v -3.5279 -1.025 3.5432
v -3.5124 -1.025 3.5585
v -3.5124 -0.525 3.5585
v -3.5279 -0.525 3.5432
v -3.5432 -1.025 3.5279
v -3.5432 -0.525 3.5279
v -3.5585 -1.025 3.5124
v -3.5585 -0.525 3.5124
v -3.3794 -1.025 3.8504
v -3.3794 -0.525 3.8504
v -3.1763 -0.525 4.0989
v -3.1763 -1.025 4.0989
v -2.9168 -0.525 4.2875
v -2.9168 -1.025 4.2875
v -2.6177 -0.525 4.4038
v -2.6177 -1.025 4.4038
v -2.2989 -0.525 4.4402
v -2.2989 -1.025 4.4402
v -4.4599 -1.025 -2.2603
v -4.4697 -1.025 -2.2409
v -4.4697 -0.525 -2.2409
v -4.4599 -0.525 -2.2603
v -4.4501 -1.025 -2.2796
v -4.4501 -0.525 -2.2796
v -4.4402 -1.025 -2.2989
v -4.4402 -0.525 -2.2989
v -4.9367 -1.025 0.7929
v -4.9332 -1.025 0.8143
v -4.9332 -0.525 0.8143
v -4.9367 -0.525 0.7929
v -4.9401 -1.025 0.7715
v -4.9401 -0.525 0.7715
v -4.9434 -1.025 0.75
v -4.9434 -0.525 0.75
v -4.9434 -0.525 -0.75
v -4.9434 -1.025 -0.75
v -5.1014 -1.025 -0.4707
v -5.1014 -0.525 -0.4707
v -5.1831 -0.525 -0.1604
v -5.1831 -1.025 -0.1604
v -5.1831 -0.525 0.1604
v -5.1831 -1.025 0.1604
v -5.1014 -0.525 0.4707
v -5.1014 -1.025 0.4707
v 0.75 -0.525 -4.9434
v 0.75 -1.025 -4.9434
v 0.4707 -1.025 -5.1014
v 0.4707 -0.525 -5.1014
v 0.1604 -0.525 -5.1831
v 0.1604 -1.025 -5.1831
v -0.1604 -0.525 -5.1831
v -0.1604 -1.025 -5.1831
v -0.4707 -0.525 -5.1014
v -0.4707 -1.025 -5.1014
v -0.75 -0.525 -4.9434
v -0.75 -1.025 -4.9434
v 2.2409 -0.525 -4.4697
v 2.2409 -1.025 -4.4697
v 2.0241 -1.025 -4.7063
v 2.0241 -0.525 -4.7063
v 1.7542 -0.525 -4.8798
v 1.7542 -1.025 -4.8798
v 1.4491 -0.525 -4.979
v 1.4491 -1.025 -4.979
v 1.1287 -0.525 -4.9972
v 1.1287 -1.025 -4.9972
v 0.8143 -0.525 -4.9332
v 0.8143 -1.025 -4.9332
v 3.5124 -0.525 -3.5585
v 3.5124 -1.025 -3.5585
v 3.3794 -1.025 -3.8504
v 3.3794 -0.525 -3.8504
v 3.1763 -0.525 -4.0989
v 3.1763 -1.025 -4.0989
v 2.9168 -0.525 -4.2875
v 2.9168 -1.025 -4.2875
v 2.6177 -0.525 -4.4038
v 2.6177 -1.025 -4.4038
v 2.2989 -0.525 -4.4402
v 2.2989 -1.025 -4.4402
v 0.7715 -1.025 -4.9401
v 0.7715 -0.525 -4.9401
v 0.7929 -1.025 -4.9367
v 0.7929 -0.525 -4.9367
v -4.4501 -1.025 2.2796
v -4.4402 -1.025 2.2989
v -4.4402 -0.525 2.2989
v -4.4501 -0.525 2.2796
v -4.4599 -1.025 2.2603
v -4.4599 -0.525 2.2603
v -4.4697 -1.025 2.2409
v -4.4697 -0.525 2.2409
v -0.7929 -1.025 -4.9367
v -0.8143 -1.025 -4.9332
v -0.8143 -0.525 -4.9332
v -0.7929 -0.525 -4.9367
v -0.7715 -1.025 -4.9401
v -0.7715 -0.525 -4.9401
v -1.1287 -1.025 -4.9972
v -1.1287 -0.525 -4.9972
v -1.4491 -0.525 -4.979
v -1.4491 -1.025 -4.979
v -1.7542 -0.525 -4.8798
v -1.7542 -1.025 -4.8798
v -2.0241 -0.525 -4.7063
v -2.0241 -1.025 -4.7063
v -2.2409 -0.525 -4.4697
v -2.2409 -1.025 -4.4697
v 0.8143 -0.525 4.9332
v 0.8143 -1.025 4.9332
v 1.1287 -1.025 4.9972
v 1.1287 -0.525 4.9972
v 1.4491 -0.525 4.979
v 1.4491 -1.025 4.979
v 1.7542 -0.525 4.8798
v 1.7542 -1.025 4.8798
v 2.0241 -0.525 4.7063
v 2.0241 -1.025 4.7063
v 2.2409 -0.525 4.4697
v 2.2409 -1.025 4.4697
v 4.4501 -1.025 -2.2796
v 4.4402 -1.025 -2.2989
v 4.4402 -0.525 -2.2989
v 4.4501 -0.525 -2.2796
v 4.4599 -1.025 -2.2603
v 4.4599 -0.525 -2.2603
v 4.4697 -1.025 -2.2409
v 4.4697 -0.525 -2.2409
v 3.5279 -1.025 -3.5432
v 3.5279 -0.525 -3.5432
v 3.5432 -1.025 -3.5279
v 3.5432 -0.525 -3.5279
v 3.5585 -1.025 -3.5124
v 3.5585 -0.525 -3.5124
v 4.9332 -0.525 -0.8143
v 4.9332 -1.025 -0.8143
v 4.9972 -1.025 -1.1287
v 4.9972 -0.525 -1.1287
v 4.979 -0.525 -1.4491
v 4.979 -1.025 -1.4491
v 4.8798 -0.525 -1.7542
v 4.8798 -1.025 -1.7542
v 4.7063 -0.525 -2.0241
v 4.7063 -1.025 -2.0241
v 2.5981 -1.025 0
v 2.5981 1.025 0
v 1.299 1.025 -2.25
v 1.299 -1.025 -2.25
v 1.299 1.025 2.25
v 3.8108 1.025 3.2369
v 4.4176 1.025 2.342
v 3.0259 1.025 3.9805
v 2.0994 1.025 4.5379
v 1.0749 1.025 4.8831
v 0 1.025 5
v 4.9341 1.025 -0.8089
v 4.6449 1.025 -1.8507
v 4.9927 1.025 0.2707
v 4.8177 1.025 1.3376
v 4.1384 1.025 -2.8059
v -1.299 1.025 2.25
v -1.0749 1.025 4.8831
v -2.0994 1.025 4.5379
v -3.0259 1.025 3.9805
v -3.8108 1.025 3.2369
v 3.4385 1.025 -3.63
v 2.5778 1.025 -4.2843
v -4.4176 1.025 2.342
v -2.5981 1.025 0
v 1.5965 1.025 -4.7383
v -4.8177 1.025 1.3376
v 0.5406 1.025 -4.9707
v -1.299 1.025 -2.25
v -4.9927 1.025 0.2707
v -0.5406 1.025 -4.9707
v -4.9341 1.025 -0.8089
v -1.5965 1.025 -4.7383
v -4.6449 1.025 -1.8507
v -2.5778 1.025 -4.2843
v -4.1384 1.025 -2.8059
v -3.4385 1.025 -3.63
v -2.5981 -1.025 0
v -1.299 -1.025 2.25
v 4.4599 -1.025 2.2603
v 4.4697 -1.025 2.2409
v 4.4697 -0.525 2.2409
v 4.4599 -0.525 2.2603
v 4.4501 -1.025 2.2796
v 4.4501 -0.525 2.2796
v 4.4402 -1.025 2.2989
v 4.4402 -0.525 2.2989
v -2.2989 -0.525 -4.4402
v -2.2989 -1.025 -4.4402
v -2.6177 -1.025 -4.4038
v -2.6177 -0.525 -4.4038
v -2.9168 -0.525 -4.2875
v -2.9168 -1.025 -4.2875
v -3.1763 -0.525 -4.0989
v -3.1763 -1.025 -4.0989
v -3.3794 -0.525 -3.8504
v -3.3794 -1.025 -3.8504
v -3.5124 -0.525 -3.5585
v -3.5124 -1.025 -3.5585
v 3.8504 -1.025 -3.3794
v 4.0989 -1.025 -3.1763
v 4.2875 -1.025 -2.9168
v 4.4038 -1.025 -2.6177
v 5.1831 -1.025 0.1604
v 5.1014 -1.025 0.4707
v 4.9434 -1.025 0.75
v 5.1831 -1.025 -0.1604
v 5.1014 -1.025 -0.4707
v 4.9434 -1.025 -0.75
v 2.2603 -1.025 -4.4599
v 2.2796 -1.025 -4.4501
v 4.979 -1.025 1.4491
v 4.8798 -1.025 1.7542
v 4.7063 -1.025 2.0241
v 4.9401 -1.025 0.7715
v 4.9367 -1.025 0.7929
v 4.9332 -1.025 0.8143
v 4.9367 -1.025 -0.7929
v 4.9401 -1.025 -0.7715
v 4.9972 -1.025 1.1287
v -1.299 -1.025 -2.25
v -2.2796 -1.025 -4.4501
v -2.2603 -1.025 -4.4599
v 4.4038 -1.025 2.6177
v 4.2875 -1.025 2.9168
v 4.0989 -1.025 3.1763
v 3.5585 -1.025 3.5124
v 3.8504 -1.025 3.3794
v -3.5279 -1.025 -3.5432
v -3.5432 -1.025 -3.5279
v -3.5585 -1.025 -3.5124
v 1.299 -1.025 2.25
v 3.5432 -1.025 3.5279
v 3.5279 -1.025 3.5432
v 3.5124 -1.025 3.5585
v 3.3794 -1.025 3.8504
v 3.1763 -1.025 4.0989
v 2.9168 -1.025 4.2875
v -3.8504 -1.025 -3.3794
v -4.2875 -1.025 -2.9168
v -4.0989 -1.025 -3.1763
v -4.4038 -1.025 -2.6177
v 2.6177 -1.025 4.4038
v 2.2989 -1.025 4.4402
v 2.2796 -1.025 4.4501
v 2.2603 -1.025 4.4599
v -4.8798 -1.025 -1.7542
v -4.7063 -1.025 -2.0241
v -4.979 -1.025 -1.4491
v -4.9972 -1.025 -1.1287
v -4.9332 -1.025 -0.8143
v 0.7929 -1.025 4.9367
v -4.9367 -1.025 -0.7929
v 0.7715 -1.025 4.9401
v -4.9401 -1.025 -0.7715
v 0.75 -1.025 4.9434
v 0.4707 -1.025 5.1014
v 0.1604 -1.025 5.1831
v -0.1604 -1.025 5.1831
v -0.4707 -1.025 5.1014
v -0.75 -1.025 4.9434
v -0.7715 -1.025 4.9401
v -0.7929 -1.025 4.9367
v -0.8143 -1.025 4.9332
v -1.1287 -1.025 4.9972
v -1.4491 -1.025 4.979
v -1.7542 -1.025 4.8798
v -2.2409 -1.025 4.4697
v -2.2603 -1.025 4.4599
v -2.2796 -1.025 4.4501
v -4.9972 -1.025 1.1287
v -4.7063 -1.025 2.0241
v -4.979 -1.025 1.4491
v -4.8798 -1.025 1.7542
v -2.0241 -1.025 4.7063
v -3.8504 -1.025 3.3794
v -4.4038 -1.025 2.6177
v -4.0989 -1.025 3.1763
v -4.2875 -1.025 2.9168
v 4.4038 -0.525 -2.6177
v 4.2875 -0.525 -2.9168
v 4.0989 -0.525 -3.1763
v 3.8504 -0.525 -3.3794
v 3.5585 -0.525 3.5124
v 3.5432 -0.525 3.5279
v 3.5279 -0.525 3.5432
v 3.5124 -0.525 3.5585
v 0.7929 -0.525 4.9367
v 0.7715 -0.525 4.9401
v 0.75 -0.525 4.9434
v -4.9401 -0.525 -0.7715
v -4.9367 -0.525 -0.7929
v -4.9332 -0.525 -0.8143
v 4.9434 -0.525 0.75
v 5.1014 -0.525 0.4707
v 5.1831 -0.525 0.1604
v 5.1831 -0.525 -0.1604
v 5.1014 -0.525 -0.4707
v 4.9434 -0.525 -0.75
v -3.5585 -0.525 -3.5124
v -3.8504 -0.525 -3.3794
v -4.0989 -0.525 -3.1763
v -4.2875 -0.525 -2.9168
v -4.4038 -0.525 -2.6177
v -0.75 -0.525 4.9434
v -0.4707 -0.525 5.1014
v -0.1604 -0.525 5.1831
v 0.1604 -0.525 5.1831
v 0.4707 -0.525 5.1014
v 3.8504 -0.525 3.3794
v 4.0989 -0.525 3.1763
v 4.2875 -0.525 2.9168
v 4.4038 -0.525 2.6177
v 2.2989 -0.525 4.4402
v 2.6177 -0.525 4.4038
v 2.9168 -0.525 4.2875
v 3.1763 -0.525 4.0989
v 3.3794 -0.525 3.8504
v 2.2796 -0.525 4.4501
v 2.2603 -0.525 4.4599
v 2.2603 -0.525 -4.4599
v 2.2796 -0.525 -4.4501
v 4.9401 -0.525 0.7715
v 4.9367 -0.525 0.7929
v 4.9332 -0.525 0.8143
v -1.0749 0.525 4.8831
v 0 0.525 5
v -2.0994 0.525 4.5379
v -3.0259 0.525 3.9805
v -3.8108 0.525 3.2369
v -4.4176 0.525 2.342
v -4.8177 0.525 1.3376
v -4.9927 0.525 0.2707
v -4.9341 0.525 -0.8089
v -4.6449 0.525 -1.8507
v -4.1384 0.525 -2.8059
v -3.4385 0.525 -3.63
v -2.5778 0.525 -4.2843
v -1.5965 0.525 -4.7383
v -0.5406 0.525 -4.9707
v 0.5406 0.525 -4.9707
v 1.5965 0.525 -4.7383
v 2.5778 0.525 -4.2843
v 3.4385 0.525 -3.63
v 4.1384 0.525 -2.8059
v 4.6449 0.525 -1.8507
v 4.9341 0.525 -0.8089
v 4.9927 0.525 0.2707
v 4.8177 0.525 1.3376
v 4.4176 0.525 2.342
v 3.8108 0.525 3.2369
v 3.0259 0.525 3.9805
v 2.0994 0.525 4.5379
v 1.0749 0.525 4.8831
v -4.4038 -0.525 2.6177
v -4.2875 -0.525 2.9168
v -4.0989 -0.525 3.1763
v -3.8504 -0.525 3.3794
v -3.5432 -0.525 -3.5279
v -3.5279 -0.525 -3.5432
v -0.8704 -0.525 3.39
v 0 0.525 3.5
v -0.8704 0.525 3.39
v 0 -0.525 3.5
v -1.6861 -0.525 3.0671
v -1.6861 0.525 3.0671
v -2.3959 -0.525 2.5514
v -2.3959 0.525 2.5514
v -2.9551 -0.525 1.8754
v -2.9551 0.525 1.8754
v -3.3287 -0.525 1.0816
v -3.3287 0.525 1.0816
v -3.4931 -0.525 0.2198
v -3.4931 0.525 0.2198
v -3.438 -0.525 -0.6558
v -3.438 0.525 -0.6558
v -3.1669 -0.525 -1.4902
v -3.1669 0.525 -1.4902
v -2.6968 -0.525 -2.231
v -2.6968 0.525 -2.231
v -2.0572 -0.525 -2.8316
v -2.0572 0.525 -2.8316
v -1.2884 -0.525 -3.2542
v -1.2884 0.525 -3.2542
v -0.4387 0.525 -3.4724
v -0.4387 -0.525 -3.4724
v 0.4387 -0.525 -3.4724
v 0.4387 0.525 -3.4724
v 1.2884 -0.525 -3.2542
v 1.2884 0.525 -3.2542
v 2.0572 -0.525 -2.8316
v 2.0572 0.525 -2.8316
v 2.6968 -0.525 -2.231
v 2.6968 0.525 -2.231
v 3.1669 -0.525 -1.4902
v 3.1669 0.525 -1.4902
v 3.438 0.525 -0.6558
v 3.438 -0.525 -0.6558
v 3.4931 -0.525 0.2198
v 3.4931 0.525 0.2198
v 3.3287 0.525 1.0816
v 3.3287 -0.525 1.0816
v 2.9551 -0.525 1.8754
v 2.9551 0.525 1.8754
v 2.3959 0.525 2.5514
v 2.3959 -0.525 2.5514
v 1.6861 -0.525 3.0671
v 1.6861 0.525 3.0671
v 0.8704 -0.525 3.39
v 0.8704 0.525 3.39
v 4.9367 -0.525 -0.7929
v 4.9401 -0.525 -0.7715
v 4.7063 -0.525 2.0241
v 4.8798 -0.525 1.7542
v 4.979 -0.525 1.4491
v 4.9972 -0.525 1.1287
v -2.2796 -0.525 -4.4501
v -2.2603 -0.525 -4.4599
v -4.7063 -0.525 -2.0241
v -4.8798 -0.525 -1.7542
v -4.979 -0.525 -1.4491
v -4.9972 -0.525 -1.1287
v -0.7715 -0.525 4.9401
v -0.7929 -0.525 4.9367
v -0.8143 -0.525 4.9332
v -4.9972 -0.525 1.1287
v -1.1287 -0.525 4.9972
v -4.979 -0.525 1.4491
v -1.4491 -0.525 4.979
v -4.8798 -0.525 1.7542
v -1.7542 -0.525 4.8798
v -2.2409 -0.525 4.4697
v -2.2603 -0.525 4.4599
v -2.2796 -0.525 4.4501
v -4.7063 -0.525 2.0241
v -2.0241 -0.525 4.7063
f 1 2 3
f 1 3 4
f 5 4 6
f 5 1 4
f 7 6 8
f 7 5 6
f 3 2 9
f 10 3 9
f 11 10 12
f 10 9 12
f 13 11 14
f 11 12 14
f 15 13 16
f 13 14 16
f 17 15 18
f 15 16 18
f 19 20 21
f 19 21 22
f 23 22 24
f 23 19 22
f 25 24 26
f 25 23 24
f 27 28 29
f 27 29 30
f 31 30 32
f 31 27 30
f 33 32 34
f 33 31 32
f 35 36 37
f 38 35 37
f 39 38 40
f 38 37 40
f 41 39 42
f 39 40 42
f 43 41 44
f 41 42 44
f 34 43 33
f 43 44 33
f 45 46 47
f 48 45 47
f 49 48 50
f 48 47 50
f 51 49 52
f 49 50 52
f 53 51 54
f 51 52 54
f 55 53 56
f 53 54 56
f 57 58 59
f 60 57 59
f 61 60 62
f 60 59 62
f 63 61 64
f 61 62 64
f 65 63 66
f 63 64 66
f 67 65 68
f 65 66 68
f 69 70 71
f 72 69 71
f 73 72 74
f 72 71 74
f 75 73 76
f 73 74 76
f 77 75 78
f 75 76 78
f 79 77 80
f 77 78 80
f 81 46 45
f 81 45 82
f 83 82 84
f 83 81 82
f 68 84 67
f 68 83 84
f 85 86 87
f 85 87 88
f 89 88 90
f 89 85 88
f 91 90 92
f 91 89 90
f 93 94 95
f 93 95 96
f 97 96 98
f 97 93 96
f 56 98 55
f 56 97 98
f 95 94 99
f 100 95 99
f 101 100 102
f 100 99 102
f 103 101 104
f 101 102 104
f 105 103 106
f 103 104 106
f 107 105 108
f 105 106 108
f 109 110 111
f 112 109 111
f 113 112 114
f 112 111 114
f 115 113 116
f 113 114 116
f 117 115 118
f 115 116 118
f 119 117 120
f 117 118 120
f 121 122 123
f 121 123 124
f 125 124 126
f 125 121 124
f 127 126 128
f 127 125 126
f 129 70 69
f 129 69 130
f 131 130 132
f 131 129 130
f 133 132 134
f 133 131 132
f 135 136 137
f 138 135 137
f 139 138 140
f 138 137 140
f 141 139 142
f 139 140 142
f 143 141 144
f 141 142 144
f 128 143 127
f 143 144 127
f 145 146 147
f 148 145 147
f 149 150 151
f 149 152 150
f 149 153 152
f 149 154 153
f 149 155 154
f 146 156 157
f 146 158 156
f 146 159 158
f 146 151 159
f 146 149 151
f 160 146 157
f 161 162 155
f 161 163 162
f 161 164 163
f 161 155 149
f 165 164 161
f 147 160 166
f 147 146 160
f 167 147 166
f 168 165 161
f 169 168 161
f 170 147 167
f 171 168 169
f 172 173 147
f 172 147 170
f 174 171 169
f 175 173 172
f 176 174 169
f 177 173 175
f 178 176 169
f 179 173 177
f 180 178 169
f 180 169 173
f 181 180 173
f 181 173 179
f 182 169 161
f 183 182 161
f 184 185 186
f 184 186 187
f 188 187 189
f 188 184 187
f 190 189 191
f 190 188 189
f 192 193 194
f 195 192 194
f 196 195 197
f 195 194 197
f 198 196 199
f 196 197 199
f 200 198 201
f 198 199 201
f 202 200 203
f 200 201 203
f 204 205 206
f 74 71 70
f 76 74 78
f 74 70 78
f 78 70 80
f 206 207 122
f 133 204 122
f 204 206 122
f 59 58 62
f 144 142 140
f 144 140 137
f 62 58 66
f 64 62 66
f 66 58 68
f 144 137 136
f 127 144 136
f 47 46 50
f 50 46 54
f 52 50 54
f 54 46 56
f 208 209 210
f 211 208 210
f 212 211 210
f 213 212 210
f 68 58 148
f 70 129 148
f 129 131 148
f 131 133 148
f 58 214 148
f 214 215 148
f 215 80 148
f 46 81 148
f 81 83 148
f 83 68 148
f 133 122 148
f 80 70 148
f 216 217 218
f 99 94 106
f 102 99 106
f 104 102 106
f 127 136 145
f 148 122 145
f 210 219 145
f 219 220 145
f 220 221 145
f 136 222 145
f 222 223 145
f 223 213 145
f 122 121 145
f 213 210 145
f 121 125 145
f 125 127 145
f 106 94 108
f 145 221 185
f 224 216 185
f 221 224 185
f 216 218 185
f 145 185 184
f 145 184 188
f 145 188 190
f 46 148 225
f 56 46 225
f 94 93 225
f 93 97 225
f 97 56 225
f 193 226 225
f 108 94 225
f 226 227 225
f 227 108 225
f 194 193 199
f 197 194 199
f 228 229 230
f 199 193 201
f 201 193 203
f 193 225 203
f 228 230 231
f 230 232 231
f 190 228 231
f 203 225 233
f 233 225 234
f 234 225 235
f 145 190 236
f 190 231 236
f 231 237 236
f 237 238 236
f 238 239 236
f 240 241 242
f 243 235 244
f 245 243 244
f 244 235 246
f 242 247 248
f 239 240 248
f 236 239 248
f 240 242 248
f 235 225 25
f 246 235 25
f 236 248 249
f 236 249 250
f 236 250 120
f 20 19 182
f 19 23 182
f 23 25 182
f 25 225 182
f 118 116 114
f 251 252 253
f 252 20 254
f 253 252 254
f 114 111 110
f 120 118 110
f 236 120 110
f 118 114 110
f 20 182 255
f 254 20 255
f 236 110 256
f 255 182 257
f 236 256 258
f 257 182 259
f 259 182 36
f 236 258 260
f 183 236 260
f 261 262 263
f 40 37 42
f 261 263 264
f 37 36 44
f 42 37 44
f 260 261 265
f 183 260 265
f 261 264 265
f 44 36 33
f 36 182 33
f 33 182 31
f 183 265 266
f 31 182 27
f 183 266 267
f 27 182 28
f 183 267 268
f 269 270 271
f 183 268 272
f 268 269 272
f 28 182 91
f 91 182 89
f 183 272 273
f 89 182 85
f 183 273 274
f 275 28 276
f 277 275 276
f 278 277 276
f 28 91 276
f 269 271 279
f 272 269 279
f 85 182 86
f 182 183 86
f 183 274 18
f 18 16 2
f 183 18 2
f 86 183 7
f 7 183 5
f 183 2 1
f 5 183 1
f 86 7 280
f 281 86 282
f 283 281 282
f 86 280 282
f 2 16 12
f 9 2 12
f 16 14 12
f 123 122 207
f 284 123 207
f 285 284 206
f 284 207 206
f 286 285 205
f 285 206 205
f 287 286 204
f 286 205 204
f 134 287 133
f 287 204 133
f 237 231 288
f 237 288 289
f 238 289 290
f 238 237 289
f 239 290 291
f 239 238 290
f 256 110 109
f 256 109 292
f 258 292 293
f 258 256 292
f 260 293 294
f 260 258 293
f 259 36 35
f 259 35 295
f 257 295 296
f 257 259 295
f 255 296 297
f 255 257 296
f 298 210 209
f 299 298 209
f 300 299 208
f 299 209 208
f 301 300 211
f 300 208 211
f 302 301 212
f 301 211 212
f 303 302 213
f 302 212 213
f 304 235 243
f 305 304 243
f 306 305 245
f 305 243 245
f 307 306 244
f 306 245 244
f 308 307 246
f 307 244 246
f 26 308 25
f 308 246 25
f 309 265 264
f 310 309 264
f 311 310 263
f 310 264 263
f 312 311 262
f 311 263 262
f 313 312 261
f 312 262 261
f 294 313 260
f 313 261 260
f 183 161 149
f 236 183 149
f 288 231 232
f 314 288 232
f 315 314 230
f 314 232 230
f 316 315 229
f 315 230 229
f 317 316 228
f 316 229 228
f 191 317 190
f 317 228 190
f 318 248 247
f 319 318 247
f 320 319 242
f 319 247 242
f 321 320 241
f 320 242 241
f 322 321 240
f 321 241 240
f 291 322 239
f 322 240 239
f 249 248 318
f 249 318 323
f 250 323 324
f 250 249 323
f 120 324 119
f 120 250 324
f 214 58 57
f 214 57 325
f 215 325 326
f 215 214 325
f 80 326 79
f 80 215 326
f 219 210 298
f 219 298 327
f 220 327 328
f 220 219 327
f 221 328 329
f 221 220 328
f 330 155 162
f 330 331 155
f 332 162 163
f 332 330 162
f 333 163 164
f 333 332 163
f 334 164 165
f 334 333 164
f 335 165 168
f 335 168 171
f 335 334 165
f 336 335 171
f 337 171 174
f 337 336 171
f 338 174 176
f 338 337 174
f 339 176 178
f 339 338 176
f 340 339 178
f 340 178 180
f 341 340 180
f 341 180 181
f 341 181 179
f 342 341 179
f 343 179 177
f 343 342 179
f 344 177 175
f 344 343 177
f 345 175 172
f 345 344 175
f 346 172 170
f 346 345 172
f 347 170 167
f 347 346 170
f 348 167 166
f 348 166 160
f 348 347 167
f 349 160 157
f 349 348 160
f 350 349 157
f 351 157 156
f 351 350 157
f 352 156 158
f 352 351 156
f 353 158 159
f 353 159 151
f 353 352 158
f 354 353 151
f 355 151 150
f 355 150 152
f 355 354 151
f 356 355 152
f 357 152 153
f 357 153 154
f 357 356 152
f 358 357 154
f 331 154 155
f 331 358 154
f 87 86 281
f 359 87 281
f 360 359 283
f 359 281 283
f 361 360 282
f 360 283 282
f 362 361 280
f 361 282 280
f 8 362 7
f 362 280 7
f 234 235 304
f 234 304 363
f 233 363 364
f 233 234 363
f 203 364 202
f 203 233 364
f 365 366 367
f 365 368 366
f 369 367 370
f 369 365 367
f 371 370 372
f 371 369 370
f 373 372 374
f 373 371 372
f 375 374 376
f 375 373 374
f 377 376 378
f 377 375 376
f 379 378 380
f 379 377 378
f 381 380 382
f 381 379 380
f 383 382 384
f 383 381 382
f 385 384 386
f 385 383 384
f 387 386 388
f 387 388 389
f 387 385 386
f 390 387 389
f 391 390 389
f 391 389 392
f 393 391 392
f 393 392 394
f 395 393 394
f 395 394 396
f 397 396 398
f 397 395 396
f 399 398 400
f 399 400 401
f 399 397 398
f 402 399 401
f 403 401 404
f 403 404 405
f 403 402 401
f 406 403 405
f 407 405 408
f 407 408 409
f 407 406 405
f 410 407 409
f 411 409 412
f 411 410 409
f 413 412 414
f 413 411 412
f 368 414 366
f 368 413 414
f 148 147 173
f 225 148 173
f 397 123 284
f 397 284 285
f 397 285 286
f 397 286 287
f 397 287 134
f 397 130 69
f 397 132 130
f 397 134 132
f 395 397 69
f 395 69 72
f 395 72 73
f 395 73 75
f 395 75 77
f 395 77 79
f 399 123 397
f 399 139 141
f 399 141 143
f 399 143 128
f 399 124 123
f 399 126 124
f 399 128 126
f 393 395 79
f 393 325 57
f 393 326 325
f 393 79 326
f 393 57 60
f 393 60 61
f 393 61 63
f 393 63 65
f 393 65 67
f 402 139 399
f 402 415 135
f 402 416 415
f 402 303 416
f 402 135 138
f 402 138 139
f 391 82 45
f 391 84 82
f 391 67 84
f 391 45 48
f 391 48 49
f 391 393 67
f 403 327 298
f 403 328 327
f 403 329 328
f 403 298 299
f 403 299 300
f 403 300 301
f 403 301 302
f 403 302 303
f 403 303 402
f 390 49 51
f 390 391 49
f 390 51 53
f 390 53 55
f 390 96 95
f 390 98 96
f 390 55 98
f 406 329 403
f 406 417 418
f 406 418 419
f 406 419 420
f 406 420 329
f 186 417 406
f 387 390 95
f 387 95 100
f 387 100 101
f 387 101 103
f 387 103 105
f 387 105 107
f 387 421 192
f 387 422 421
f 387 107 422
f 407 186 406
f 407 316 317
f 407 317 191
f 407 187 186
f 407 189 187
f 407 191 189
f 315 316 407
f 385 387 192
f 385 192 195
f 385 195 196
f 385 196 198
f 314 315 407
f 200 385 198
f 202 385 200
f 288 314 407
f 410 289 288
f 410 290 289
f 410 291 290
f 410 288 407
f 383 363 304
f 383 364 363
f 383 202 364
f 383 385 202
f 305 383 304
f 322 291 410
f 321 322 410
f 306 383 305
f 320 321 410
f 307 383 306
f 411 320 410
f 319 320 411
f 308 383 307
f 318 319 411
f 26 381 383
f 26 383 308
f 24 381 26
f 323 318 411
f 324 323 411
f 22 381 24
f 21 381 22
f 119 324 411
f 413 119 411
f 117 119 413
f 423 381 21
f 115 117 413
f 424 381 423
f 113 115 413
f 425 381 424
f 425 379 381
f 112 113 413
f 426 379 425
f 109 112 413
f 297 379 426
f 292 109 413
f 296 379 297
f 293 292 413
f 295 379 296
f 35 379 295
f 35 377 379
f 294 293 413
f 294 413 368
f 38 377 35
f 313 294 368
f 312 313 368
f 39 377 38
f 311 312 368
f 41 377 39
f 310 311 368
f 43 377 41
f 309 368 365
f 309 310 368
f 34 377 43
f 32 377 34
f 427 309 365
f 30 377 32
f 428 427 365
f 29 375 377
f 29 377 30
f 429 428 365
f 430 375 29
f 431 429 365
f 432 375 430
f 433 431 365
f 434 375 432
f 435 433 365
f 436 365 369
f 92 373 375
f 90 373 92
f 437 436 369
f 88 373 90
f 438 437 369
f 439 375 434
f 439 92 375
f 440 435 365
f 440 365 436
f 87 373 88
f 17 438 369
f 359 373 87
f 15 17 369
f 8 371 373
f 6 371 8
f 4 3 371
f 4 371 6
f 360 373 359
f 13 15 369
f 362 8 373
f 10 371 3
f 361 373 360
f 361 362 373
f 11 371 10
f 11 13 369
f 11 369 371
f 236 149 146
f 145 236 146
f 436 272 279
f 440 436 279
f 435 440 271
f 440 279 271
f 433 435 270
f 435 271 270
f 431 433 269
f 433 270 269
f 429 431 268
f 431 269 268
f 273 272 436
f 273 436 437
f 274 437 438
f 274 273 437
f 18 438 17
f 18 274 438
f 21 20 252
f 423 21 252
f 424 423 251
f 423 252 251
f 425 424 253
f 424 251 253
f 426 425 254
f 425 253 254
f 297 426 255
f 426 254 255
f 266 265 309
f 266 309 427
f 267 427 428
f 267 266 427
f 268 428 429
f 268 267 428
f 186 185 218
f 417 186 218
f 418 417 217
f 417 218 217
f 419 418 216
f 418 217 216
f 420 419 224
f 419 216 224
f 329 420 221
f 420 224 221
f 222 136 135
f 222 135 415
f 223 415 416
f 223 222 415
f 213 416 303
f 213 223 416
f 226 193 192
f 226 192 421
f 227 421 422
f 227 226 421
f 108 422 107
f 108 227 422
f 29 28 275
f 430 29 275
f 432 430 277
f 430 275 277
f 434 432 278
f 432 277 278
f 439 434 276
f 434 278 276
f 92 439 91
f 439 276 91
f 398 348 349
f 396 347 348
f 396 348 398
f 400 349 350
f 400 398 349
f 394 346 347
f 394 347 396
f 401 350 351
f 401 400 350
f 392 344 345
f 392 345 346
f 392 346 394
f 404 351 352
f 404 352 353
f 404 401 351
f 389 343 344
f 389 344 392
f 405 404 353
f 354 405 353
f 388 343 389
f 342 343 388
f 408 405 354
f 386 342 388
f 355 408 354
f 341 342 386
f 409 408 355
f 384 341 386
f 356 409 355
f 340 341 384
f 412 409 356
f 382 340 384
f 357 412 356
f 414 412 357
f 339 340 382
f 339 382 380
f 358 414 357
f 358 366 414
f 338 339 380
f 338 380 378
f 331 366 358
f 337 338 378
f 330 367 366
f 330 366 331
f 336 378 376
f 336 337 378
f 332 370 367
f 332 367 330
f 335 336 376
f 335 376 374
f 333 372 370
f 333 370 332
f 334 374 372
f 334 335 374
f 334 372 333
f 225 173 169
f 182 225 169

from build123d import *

# Parameters (mm, degrees)
BOSS_EXTRUDE1_DEPTH     = 0.5
CIRPATTERN3_COUNT       = 20
CUT_EXTRUDE1_DEPTH      = 1
CUT_EXTRUDE1_DEPTH_BACK = 3.05


with BuildPart() as part:
    # Sketch1 → Revolve1 (revolve)
    with BuildSketch(Plane(origin=(0, 0, 0), x_dir=(0, 0, -1), z_dir=(1, 0, 0))):
        Polygon((-3.5, 0.525), (-3.5, -0.525), (-5, -0.525), (-5, -1.025), (0, -1.025), (0, -0.525), (0, 0.525), (0, 1.025), (-5, 1.025), (-5, 0.525), align=None)
    revolve(axis=Axis((0, 0, 0), (0, -1, 0)))

    # Sketch3 → Boss-Extrude1 (add)
    with BuildSketch(Plane.XZ.offset(1.025)):
        with BuildLine():
            ThreePointArc((-0.75, 4.943429983), (0, 5.193429983), (0.75, 4.943429983))
            ThreePointArc((0.75, 4.943429983), (0, 5), (-0.75, 4.943429983))
        make_face()
    boss_extrude1 = extrude(amount=-BOSS_EXTRUDE1_DEPTH)

    # CirPattern3: Boss-Extrude1 ×20 about axis
    cirpattern3_axis = Axis((0, 0, 0), (0, 1, 0))
    for i in range(1, CIRPATTERN3_COUNT):
        add(boss_extrude1.rotate(cirpattern3_axis, i * 360 / CIRPATTERN3_COUNT))

    # Sketch4 → Cut-Extrude1 (cut, two sides)
    with BuildSketch(Plane(origin=(0, 1.025, 0), x_dir=(1, 0, 0), z_dir=(0, 1, 0))) as cut_extrude1_sk:
        Polygon((1.299038106, 2.25), (-1.299038106, 2.25), (-2.598076211, 0), (-1.299038106, -2.25), (1.299038106, -2.25), (2.598076211, 0), align=None)
    extrude(amount=CUT_EXTRUDE1_DEPTH, mode=Mode.SUBTRACT)
    extrude(cut_extrude1_sk.sketch, amount=-CUT_EXTRUDE1_DEPTH_BACK, mode=Mode.SUBTRACT)


solid = part.part
